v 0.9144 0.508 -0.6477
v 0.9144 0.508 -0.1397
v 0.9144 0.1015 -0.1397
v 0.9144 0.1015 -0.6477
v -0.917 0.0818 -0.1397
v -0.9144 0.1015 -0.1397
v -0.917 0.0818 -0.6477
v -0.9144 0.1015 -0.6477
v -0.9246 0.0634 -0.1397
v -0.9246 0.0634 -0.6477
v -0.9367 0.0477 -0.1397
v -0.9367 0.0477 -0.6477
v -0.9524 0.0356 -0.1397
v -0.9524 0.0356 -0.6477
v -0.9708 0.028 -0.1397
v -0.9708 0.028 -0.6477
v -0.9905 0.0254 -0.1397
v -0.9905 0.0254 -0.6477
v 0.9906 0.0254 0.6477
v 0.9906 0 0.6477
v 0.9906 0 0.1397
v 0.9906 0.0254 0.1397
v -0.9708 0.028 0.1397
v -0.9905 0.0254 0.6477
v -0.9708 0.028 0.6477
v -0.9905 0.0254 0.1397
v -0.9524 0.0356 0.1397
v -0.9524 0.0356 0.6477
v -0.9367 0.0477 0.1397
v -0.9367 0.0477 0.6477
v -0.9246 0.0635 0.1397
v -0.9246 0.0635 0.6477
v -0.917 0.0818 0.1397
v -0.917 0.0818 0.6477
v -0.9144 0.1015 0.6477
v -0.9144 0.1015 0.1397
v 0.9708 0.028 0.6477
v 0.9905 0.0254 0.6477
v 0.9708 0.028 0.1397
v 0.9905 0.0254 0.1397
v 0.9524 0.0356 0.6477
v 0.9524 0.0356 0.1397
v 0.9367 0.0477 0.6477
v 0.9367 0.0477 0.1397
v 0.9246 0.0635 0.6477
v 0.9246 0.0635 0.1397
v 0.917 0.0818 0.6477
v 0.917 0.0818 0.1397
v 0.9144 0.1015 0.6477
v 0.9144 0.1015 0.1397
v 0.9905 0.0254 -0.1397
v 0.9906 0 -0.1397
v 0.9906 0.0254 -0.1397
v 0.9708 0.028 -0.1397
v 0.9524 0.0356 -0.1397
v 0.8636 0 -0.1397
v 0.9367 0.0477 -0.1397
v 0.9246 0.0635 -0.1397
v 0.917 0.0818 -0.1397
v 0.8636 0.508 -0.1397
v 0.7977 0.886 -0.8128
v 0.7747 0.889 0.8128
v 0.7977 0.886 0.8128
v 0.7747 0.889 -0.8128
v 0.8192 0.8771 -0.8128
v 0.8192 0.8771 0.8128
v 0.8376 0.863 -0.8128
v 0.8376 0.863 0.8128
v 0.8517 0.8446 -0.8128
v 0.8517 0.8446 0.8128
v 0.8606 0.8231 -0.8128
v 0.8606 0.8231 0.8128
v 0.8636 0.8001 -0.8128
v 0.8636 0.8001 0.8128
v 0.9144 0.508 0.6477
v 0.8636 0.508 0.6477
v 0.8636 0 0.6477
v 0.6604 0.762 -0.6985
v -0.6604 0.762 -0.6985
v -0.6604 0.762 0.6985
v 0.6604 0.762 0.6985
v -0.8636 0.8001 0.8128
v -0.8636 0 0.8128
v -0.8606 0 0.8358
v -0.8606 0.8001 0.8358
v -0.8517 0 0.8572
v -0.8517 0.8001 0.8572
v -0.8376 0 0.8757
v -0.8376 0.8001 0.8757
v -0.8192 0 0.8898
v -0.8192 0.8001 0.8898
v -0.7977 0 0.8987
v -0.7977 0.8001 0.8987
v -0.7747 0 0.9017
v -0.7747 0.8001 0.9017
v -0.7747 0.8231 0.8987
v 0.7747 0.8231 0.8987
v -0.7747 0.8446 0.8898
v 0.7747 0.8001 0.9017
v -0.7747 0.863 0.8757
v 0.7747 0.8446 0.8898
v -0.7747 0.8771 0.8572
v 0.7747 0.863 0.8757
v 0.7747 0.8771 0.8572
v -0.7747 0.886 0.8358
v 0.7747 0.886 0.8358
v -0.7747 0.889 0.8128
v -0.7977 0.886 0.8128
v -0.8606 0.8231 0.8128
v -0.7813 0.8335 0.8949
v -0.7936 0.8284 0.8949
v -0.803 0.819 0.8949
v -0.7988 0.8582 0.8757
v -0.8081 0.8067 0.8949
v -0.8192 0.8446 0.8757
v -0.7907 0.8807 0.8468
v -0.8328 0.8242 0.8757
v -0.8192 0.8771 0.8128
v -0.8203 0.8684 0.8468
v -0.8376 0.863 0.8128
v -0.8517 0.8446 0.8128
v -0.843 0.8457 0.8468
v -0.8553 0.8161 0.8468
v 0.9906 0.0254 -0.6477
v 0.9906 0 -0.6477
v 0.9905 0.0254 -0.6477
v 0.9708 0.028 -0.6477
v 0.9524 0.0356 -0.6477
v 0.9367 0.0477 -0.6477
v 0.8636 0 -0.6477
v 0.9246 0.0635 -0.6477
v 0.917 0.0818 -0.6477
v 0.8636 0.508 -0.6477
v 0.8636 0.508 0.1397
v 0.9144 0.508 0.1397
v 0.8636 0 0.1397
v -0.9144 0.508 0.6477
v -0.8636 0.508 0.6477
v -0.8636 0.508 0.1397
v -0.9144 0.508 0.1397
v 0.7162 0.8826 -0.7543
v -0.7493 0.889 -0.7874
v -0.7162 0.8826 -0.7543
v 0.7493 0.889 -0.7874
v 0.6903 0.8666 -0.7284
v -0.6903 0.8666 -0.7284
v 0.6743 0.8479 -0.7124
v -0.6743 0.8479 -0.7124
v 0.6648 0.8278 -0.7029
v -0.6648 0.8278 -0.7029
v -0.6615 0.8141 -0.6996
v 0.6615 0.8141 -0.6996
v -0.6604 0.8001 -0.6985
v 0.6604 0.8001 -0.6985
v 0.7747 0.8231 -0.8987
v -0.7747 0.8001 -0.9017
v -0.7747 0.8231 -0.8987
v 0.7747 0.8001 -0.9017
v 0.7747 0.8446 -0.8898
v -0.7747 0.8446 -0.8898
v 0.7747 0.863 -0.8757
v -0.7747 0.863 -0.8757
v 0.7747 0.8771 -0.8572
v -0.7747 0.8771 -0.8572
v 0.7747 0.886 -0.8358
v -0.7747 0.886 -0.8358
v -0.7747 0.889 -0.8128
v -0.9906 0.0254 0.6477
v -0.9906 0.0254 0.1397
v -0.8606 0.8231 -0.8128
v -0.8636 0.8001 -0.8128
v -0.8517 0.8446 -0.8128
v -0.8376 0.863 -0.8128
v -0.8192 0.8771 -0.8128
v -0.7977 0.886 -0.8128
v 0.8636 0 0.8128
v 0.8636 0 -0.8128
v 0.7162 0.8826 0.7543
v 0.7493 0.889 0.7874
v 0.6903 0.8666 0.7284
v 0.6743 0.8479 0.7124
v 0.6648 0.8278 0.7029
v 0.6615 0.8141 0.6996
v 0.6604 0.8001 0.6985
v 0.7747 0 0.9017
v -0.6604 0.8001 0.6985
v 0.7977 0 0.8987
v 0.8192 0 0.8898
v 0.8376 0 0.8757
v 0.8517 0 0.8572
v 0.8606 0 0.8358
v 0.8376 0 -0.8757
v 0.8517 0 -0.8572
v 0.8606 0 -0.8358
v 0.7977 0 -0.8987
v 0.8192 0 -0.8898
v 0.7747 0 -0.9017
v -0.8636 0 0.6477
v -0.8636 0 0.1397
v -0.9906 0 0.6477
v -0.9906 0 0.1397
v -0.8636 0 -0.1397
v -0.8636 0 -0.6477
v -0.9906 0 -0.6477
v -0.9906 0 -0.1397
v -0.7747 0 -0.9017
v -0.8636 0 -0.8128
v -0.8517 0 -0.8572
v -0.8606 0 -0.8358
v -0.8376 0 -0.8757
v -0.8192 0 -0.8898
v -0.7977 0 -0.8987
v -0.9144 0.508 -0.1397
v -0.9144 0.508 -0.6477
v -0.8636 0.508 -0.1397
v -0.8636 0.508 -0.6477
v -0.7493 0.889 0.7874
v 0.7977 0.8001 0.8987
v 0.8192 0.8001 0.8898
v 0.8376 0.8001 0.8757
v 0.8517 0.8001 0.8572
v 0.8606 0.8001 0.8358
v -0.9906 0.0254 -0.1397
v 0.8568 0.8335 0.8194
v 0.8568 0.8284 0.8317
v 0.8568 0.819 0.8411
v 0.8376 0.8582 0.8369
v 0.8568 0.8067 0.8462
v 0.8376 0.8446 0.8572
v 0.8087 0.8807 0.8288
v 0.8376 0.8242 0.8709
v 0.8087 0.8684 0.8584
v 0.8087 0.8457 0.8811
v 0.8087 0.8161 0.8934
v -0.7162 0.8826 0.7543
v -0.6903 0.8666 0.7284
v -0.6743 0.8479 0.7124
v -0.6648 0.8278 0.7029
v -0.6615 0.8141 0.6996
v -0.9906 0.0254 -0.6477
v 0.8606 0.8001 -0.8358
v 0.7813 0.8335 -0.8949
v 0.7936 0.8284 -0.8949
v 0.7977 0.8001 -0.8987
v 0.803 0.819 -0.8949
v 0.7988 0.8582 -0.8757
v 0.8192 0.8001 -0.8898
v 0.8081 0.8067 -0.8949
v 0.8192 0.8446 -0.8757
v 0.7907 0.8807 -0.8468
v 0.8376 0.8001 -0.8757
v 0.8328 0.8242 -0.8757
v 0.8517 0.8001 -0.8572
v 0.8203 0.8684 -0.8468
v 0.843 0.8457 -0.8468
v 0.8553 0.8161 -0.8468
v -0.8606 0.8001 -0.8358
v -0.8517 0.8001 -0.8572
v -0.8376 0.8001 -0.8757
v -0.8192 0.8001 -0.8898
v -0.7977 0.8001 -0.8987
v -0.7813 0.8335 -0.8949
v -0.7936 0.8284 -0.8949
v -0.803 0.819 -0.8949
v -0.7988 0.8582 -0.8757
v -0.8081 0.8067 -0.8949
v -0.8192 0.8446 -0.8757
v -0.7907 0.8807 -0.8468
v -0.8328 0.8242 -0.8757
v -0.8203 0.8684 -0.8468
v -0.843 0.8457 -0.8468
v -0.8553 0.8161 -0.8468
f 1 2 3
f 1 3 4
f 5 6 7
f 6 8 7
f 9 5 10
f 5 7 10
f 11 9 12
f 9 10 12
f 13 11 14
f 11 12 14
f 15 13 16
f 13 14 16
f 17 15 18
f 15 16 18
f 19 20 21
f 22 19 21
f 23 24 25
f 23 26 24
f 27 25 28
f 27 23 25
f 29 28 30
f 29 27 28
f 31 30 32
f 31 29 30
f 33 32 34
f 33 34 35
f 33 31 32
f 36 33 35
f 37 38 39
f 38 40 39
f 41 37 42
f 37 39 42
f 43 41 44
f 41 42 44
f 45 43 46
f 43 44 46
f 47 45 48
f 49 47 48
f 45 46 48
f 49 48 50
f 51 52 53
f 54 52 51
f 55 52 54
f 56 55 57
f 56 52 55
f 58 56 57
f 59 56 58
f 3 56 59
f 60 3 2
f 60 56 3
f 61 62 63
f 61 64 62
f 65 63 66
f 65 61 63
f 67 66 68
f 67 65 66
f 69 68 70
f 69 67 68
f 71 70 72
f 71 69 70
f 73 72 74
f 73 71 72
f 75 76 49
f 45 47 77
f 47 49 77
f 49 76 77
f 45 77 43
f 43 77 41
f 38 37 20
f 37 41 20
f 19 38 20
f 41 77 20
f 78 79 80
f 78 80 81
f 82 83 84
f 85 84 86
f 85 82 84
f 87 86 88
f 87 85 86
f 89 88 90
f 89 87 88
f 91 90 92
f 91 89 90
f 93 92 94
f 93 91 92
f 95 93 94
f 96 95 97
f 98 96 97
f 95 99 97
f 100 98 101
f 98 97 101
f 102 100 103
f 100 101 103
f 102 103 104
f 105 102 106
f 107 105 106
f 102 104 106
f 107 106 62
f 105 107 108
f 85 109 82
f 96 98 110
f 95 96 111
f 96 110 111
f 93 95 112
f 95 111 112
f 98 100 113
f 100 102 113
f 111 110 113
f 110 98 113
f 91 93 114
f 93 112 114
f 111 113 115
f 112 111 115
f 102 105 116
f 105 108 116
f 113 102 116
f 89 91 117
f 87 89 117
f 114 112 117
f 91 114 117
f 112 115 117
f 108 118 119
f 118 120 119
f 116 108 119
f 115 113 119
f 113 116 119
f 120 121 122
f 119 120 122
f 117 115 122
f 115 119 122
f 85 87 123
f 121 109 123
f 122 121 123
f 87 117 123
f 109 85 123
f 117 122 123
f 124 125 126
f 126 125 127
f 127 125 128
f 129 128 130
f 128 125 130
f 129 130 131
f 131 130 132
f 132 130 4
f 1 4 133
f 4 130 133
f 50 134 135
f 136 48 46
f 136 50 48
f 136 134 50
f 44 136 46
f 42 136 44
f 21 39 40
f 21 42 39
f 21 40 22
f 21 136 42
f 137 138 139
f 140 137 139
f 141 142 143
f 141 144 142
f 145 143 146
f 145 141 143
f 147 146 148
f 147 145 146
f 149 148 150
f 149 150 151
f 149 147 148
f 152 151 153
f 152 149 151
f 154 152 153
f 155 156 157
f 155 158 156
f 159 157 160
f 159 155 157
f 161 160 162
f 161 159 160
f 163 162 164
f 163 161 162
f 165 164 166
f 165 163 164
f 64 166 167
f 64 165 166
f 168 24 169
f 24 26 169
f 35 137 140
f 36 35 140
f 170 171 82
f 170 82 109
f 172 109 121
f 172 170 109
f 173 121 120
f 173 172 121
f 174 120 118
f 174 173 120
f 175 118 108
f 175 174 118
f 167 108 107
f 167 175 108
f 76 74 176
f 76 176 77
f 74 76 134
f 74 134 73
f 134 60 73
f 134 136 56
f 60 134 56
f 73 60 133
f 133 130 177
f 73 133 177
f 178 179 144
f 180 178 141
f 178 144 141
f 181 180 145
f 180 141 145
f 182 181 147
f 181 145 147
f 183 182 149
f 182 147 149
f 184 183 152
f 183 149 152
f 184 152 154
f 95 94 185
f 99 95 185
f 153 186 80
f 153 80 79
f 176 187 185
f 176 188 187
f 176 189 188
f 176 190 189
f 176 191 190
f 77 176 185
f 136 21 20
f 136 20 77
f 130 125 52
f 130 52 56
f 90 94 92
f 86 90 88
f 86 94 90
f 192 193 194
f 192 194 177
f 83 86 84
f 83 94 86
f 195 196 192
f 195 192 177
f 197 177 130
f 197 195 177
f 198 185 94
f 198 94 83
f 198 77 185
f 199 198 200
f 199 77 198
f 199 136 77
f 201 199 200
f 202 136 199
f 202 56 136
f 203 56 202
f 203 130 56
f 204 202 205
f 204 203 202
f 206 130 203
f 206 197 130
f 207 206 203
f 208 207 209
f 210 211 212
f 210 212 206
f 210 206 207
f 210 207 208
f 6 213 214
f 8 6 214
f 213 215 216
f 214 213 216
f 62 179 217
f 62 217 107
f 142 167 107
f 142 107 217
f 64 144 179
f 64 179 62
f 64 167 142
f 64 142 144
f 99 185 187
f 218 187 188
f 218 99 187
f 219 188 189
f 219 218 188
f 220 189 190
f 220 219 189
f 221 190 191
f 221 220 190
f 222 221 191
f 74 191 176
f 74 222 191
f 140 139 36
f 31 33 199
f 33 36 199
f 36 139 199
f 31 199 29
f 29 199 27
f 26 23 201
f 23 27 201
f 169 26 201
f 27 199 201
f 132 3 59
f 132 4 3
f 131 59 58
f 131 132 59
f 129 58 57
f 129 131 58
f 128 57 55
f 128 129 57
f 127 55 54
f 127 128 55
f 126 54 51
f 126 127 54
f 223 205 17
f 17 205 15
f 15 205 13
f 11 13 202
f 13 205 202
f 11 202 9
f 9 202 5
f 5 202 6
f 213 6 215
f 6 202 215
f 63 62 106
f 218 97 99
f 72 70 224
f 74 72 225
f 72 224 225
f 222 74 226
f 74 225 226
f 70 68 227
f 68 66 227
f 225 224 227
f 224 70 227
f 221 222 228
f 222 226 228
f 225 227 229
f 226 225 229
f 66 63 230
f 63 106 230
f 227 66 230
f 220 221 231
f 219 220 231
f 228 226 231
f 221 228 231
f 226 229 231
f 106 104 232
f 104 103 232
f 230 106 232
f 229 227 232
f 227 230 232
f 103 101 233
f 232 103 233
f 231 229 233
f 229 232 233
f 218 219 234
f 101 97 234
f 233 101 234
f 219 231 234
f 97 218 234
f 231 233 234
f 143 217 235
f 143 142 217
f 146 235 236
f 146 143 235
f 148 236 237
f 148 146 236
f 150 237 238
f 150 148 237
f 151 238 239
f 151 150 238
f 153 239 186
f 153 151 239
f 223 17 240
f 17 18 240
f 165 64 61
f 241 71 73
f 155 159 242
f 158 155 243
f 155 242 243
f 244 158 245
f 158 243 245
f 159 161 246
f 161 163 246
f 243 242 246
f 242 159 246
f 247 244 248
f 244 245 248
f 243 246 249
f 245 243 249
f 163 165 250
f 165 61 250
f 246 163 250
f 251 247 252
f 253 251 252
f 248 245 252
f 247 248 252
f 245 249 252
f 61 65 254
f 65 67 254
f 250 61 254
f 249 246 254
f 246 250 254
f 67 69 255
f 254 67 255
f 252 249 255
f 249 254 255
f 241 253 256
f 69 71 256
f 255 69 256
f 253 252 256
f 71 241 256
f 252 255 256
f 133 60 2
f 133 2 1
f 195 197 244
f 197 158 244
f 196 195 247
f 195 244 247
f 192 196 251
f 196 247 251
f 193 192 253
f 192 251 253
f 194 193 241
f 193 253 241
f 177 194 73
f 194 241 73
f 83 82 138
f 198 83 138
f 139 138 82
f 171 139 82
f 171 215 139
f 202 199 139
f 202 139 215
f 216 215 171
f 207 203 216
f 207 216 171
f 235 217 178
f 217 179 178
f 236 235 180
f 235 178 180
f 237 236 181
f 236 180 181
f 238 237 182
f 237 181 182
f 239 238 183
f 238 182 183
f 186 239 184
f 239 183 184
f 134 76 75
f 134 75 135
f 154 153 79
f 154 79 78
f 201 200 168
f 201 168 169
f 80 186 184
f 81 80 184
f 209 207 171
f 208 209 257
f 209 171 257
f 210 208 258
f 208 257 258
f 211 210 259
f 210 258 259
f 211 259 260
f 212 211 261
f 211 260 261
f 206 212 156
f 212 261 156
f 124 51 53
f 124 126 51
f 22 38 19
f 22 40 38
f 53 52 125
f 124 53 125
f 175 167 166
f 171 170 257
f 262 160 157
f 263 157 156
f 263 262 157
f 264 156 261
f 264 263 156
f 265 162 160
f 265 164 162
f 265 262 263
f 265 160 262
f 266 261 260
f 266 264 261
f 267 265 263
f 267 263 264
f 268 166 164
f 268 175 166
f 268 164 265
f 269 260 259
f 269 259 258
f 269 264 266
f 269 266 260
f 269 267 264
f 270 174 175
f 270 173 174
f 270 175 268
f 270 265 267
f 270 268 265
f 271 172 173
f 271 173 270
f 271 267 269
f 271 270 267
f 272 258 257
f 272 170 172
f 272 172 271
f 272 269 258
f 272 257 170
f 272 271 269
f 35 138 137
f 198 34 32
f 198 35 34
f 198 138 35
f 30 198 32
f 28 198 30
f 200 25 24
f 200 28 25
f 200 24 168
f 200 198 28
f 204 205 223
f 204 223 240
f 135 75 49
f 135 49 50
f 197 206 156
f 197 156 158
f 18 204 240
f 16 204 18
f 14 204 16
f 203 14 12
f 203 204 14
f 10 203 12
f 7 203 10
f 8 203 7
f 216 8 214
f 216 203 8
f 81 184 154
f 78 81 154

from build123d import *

# Parameters (mm, degrees)
SKETCH1_W            = 1.7272
SKETCH1_H            = 1.8034
BOSS_EXTRUDE1_DEPTH  = 0.889
SKETCH2_W            = 1.3208
SKETCH2_H            = 1.397
CUT_EXTRUDE1_DEPTH   = 0.127
FILLET1_R            = 0.0889
SKETCH3_W            = 0.508
SKETCH3_H            = 0.508
BOSS_EXTRUDE2_DEPTH  = 0.0508
SKETCH4_W            = 0.0762
SKETCH4_H            = 0.508
BOSS_EXTRUDE3_DEPTH  = 0.0254
FILLET2_R            = 0.0762
FILLET2_OF_MIRROR1_R = 0.0762


with BuildPart() as part:
    # Sketch1 → Boss-Extrude1 (new body)
    with BuildSketch(Plane(origin=(0, 0, 0), x_dir=(1, 0, 0), z_dir=(0, 1, 0))):
        Rectangle(SKETCH1_W, SKETCH1_H)
    extrude(amount=BOSS_EXTRUDE1_DEPTH)

    # Sketch2 → Cut-Extrude1 (cut)
    with BuildSketch(Plane(origin=(0, 0.889, 0), x_dir=(1, 0, 0), z_dir=(0, 1, 0))):
        Rectangle(SKETCH2_W, SKETCH2_H)
    extrude(amount=-CUT_EXTRUDE1_DEPTH, mode=Mode.SUBTRACT)

    # Fillet1
    fillet1_edges = [part.edges().sort_by_distance(p)[0] for p in [
        (-0.8636, 0.889, 0),
        (0, 0.889, 0.9017),
        (0.6604, 0.889, 0),
        (0, 0.889, -0.6985),
        (-0.6604, 0.889, 0),
        (0, 0.889, 0.6985),
        (0.8636, 0.889, 0),
        (0, 0.889, -0.9017),
        (0.8636, 0.4445, 0.9017),
        (-0.8636, 0.4445, 0.9017),
        (-0.8636, 0.4445, -0.9017),
        (0.8636, 0.4445, -0.9017),
    ]]
    fillet(fillet1_edges, radius=FILLET1_R)

    # Sketch3 → Boss-Extrude2 (add)
    with BuildSketch(Plane(origin=(0.8636, 0, 0), x_dir=(0, 0, -1), z_dir=(1, 0, 0))):
        with Locations((-0.3937, 0.254)):
            Rectangle(SKETCH3_W, SKETCH3_H)
        with Locations((0.3937, 0.254)):
            Rectangle(SKETCH3_W, SKETCH3_H)
    boss_extrude2 = extrude(amount=BOSS_EXTRUDE2_DEPTH)

    # Sketch4 → Boss-Extrude3 (add)
    with BuildSketch(Plane(origin=(0, 0, 0), x_dir=(1, 0, 0), z_dir=(0, 1, 0))):
        with Locations((0.9525, -0.3937)):
            Rectangle(SKETCH4_W, SKETCH4_H)
        with Locations((0.9525, 0.3937)):
            Rectangle(SKETCH4_W, SKETCH4_H)
    boss_extrude3 = extrude(amount=BOSS_EXTRUDE3_DEPTH)

    # Fillet2
    fillet2_edges = [part.edges().sort_by_distance(p)[0] for p in [
        (0.9144, 0.0254, 0.3937),
        (0.9144, 0.0254, -0.3937),
    ]]
    fillet(fillet2_edges, radius=FILLET2_R - 0.0001)  # a hair under: the kernel refuses the full size

    # Mirror1: Boss-Extrude2, Boss-Extrude3 across plane
    add(boss_extrude2.mirror(Plane(origin=(0, 0, 0), x_dir=(0, 0, 1), z_dir=(1, 0, 0))))
    add(boss_extrude3.mirror(Plane(origin=(0, 0, 0), x_dir=(0, 0, 1), z_dir=(1, 0, 0))))

    # Fillet2 of Mirror1
    fillet2_of_mirror1_edges = [part.edges().sort_by_distance(p)[0] for p in [
        (-0.9144, 0.0254, 0.3937),
        (-0.9144, 0.0254, -0.3937),
    ]]
    fillet(fillet2_of_mirror1_edges, radius=FILLET2_OF_MIRROR1_R - 0.0001)  # a hair under: the kernel refuses the full size


solid = part.part
